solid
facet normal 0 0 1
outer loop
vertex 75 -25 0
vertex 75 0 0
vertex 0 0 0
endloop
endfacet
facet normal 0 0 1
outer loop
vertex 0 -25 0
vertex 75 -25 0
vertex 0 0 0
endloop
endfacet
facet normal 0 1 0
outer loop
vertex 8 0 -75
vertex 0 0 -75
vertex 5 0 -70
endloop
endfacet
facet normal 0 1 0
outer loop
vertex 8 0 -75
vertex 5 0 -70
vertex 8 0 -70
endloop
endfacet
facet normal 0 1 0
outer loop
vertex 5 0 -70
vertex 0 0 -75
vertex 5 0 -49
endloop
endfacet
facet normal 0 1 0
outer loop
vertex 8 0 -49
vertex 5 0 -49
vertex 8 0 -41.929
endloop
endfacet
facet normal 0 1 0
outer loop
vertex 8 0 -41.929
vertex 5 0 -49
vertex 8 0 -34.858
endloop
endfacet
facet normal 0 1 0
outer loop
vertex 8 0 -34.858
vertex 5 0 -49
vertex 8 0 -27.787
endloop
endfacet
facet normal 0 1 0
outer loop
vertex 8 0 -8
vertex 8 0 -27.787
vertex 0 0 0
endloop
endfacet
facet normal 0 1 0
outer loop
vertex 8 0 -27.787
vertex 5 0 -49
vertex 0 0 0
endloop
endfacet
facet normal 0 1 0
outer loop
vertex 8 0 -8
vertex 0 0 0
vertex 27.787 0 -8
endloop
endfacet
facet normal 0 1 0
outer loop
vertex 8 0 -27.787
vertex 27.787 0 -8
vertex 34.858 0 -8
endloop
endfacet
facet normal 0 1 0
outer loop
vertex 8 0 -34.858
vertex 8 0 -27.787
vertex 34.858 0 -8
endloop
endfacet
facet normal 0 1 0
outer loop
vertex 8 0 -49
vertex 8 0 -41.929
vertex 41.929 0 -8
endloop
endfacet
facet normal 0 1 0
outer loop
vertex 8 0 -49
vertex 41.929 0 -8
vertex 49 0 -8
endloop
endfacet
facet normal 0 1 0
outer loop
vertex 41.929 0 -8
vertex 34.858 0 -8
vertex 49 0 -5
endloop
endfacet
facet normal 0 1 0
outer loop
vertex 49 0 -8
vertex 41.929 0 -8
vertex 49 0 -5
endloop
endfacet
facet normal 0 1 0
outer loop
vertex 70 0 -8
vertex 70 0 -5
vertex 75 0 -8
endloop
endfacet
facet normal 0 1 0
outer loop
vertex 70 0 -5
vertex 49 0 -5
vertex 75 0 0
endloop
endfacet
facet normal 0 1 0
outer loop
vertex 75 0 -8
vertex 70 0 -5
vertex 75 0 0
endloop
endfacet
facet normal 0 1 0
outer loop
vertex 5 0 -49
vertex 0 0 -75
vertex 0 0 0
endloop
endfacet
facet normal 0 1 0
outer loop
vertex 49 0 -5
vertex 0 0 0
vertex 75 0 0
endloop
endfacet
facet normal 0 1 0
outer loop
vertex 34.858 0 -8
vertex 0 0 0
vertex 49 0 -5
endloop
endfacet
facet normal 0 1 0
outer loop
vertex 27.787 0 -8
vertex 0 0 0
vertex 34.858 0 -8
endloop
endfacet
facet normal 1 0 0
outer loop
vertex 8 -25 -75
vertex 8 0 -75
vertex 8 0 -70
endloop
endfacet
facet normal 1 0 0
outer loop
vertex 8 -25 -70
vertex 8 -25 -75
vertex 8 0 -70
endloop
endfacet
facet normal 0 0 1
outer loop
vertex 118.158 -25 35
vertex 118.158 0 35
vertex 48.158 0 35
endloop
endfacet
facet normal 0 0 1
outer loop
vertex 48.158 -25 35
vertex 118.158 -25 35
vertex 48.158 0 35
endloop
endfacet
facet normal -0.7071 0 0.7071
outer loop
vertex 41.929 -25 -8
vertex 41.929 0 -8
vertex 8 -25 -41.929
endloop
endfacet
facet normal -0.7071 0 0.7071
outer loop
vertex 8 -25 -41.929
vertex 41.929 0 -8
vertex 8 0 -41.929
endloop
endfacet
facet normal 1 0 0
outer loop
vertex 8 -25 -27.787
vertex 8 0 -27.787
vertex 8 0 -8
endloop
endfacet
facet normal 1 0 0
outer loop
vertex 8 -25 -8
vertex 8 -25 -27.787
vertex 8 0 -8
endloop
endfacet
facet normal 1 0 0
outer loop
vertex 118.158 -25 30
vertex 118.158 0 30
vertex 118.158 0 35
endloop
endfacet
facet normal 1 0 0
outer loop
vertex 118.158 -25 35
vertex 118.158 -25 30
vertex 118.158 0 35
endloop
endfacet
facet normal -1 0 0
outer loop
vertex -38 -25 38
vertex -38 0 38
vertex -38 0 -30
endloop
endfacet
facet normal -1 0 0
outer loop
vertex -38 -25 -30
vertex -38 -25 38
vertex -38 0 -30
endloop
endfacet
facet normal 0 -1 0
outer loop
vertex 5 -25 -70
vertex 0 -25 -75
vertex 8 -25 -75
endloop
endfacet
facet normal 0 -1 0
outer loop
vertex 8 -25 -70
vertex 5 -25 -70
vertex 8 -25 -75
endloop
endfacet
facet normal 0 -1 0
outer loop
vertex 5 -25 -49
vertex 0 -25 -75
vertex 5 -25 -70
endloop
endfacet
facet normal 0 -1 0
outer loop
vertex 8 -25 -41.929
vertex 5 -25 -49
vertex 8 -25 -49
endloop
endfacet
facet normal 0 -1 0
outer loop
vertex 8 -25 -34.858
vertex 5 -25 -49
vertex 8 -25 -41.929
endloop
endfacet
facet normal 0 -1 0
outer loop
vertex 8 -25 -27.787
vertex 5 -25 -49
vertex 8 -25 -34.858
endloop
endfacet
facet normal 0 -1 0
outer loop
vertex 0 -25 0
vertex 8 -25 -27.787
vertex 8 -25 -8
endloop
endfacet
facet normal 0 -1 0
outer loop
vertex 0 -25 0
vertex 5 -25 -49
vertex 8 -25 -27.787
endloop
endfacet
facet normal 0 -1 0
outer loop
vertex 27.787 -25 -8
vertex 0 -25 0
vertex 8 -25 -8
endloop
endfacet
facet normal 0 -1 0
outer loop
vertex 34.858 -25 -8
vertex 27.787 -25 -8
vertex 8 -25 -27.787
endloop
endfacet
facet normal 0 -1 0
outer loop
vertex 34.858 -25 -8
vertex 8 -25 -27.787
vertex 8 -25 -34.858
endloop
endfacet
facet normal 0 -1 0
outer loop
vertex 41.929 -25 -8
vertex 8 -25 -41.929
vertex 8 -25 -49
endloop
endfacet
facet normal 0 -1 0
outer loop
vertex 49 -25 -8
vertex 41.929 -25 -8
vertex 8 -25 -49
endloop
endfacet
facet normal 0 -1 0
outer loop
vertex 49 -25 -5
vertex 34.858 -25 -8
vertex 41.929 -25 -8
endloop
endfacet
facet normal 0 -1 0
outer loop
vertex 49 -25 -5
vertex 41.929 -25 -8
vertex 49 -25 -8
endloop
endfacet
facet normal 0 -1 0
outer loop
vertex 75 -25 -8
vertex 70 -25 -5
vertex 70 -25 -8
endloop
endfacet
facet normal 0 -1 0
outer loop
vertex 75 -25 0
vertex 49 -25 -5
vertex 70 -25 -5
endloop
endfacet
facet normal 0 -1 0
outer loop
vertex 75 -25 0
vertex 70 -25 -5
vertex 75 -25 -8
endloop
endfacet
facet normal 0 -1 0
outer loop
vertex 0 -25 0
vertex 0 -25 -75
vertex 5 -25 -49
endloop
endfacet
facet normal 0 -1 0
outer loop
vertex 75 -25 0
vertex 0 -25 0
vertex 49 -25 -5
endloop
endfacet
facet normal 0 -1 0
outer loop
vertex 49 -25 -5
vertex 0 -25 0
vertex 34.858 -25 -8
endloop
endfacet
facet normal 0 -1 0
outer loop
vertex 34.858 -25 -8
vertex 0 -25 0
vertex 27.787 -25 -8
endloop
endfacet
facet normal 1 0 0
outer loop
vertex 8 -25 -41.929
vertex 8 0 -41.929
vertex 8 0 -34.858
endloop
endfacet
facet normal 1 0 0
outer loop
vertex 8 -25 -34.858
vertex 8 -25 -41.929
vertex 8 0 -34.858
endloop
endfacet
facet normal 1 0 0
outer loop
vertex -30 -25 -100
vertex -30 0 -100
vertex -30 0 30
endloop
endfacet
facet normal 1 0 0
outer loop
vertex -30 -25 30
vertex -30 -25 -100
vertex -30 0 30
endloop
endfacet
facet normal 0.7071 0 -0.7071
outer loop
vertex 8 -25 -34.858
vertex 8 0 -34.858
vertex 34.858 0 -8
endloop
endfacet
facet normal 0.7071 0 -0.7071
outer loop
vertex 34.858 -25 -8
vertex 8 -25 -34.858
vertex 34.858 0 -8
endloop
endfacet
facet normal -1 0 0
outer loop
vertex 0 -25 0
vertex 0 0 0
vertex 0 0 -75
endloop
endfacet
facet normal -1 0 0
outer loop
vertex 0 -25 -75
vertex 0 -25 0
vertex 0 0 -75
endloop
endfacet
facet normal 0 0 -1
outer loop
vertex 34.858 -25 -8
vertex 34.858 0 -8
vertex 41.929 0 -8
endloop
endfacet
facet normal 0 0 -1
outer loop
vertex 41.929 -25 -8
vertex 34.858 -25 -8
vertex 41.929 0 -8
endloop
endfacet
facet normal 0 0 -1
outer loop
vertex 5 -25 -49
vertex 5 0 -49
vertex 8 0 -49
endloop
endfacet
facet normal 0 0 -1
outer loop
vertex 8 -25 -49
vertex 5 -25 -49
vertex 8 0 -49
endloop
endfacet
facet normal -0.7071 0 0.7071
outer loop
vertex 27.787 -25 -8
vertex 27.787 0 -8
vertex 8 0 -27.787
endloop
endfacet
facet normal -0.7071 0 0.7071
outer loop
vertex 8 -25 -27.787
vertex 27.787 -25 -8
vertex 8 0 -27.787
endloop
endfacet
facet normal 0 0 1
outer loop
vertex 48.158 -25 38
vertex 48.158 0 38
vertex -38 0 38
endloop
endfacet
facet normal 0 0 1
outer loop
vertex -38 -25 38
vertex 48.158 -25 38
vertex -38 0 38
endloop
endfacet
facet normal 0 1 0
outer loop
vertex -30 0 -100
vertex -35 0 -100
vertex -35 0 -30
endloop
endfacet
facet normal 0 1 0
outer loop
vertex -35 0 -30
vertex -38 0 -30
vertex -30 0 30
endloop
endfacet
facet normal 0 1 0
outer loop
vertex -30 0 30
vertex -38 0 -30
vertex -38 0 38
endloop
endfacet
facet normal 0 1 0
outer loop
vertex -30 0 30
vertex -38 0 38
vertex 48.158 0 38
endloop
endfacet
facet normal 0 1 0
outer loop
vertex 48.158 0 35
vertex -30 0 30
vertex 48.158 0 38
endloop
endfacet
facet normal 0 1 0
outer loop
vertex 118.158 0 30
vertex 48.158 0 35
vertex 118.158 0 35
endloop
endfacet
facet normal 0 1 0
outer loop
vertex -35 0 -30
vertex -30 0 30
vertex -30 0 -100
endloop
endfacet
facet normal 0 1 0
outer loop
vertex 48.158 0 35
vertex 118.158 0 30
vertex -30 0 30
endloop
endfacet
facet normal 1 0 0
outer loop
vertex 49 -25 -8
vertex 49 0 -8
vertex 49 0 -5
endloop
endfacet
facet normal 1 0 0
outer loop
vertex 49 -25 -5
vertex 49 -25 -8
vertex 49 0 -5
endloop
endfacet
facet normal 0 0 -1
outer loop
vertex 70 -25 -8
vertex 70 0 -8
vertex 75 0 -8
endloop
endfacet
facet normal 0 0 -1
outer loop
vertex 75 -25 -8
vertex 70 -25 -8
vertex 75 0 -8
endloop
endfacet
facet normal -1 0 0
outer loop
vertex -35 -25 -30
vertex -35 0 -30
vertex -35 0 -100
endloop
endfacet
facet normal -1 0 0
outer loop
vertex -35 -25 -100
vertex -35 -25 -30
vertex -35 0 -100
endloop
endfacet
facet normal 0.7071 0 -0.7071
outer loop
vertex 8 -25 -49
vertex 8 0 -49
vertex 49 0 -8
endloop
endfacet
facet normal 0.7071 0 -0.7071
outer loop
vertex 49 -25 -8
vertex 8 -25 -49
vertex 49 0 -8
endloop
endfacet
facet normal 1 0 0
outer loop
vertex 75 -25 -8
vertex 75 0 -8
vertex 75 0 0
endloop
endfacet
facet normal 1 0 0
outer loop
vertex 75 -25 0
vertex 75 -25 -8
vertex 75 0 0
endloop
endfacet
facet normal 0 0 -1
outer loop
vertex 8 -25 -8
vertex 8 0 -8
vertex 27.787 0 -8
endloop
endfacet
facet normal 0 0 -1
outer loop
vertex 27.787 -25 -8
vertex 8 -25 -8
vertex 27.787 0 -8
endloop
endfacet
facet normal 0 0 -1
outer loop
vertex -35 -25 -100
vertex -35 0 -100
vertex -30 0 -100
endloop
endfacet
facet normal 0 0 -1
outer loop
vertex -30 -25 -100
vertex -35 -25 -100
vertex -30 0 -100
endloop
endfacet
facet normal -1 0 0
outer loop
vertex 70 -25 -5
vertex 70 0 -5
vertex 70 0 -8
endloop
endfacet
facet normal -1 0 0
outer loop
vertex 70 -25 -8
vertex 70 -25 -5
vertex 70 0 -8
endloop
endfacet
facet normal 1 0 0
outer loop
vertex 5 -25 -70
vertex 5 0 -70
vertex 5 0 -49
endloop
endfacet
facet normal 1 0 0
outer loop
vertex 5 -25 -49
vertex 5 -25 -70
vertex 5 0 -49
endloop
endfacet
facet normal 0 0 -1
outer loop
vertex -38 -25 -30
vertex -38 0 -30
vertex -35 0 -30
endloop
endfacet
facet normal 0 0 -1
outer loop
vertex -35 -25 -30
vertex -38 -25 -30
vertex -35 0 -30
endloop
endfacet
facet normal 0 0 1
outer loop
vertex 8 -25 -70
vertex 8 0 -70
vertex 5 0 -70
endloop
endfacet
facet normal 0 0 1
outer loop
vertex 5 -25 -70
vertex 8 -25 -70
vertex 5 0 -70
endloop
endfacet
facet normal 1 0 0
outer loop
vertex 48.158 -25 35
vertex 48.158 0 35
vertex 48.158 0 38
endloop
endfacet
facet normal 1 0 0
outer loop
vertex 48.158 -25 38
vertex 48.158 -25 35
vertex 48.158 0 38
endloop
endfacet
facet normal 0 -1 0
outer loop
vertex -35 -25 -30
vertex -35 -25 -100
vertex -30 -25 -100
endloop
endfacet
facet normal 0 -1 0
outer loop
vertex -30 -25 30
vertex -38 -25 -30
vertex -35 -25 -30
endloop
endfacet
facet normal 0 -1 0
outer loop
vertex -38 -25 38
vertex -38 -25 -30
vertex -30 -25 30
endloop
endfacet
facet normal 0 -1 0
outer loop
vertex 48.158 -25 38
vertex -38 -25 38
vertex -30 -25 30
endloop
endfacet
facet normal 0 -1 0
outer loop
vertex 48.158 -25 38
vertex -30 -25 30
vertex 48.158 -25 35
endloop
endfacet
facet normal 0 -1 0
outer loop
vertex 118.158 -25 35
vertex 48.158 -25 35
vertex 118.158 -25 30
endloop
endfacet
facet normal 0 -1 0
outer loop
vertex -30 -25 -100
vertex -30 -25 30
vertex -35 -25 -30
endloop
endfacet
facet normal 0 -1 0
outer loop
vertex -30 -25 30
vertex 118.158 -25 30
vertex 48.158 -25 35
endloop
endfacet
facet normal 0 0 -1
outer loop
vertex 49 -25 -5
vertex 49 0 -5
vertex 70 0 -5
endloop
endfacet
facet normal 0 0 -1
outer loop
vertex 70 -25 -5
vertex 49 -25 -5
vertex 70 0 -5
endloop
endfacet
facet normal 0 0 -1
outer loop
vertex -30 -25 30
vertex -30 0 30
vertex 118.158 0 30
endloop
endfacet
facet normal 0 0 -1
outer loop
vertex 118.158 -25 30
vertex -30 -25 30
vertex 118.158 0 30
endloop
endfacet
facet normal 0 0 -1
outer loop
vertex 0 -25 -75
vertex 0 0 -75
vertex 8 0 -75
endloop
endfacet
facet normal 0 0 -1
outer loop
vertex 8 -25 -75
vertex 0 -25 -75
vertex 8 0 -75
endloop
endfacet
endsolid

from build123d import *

# Parameters (mm, degrees)
F0_W     = 8
F0_H     = 8
F1_DEPTH = 25
F3_DEPTH = 25


with BuildPart() as f1:
    # F0 (on Front) → F1 (new body)
    with BuildSketch(Plane.XZ):
        with Locations((4, -4)):
            Rectangle(F0_W, F0_H)
        Polygon((8, -8), (0, -8), (0, -35.7867951971), (8, -27.7867951971), align=None)
        Polygon((35.7867951971, 0), (8, 0), (8, -8), (27.7867951971, -8), align=None)
        Polygon((8, -27.7867951971), (0, -35.7867951971), (0, -75), (5, -75), (8, -75), (8, -70), (5, -70), (5, -49), (8, -49), (8, -41.9289321881), (8, -34.857863009), align=None)
        Polygon((75, 0), (35.7867951971, 0), (27.7867951971, -8), (34.857863009, -8), (41.9289321881, -8), (49, -8), (49, -5), (70, -5), (70, -8), (75, -8), align=None)
        Polygon((41.9289321881, -8), (8, -41.9289321881), (8, -49), (49, -8), align=None)
        Polygon((27.7867951971, -8), (8, -27.7867951971), (8, -34.857863009), (34.857863009, -8), align=None)
    extrude(amount=F1_DEPTH)


with BuildPart() as f3:
    # F2 (on Front) → F3 (new body)
    with BuildSketch(Plane.XZ):
        Polygon((-30, -100), (-30, 30), (118.1583255529, 30), (118.1583255529, 35), (48.1583255529, 35), (48.1583255529, 38), (-38, 38), (-38, -30), (-35, -30), (-35, -100), align=None)
    extrude(amount=F3_DEPTH)


solid = Compound([f1.part, f3.part])
